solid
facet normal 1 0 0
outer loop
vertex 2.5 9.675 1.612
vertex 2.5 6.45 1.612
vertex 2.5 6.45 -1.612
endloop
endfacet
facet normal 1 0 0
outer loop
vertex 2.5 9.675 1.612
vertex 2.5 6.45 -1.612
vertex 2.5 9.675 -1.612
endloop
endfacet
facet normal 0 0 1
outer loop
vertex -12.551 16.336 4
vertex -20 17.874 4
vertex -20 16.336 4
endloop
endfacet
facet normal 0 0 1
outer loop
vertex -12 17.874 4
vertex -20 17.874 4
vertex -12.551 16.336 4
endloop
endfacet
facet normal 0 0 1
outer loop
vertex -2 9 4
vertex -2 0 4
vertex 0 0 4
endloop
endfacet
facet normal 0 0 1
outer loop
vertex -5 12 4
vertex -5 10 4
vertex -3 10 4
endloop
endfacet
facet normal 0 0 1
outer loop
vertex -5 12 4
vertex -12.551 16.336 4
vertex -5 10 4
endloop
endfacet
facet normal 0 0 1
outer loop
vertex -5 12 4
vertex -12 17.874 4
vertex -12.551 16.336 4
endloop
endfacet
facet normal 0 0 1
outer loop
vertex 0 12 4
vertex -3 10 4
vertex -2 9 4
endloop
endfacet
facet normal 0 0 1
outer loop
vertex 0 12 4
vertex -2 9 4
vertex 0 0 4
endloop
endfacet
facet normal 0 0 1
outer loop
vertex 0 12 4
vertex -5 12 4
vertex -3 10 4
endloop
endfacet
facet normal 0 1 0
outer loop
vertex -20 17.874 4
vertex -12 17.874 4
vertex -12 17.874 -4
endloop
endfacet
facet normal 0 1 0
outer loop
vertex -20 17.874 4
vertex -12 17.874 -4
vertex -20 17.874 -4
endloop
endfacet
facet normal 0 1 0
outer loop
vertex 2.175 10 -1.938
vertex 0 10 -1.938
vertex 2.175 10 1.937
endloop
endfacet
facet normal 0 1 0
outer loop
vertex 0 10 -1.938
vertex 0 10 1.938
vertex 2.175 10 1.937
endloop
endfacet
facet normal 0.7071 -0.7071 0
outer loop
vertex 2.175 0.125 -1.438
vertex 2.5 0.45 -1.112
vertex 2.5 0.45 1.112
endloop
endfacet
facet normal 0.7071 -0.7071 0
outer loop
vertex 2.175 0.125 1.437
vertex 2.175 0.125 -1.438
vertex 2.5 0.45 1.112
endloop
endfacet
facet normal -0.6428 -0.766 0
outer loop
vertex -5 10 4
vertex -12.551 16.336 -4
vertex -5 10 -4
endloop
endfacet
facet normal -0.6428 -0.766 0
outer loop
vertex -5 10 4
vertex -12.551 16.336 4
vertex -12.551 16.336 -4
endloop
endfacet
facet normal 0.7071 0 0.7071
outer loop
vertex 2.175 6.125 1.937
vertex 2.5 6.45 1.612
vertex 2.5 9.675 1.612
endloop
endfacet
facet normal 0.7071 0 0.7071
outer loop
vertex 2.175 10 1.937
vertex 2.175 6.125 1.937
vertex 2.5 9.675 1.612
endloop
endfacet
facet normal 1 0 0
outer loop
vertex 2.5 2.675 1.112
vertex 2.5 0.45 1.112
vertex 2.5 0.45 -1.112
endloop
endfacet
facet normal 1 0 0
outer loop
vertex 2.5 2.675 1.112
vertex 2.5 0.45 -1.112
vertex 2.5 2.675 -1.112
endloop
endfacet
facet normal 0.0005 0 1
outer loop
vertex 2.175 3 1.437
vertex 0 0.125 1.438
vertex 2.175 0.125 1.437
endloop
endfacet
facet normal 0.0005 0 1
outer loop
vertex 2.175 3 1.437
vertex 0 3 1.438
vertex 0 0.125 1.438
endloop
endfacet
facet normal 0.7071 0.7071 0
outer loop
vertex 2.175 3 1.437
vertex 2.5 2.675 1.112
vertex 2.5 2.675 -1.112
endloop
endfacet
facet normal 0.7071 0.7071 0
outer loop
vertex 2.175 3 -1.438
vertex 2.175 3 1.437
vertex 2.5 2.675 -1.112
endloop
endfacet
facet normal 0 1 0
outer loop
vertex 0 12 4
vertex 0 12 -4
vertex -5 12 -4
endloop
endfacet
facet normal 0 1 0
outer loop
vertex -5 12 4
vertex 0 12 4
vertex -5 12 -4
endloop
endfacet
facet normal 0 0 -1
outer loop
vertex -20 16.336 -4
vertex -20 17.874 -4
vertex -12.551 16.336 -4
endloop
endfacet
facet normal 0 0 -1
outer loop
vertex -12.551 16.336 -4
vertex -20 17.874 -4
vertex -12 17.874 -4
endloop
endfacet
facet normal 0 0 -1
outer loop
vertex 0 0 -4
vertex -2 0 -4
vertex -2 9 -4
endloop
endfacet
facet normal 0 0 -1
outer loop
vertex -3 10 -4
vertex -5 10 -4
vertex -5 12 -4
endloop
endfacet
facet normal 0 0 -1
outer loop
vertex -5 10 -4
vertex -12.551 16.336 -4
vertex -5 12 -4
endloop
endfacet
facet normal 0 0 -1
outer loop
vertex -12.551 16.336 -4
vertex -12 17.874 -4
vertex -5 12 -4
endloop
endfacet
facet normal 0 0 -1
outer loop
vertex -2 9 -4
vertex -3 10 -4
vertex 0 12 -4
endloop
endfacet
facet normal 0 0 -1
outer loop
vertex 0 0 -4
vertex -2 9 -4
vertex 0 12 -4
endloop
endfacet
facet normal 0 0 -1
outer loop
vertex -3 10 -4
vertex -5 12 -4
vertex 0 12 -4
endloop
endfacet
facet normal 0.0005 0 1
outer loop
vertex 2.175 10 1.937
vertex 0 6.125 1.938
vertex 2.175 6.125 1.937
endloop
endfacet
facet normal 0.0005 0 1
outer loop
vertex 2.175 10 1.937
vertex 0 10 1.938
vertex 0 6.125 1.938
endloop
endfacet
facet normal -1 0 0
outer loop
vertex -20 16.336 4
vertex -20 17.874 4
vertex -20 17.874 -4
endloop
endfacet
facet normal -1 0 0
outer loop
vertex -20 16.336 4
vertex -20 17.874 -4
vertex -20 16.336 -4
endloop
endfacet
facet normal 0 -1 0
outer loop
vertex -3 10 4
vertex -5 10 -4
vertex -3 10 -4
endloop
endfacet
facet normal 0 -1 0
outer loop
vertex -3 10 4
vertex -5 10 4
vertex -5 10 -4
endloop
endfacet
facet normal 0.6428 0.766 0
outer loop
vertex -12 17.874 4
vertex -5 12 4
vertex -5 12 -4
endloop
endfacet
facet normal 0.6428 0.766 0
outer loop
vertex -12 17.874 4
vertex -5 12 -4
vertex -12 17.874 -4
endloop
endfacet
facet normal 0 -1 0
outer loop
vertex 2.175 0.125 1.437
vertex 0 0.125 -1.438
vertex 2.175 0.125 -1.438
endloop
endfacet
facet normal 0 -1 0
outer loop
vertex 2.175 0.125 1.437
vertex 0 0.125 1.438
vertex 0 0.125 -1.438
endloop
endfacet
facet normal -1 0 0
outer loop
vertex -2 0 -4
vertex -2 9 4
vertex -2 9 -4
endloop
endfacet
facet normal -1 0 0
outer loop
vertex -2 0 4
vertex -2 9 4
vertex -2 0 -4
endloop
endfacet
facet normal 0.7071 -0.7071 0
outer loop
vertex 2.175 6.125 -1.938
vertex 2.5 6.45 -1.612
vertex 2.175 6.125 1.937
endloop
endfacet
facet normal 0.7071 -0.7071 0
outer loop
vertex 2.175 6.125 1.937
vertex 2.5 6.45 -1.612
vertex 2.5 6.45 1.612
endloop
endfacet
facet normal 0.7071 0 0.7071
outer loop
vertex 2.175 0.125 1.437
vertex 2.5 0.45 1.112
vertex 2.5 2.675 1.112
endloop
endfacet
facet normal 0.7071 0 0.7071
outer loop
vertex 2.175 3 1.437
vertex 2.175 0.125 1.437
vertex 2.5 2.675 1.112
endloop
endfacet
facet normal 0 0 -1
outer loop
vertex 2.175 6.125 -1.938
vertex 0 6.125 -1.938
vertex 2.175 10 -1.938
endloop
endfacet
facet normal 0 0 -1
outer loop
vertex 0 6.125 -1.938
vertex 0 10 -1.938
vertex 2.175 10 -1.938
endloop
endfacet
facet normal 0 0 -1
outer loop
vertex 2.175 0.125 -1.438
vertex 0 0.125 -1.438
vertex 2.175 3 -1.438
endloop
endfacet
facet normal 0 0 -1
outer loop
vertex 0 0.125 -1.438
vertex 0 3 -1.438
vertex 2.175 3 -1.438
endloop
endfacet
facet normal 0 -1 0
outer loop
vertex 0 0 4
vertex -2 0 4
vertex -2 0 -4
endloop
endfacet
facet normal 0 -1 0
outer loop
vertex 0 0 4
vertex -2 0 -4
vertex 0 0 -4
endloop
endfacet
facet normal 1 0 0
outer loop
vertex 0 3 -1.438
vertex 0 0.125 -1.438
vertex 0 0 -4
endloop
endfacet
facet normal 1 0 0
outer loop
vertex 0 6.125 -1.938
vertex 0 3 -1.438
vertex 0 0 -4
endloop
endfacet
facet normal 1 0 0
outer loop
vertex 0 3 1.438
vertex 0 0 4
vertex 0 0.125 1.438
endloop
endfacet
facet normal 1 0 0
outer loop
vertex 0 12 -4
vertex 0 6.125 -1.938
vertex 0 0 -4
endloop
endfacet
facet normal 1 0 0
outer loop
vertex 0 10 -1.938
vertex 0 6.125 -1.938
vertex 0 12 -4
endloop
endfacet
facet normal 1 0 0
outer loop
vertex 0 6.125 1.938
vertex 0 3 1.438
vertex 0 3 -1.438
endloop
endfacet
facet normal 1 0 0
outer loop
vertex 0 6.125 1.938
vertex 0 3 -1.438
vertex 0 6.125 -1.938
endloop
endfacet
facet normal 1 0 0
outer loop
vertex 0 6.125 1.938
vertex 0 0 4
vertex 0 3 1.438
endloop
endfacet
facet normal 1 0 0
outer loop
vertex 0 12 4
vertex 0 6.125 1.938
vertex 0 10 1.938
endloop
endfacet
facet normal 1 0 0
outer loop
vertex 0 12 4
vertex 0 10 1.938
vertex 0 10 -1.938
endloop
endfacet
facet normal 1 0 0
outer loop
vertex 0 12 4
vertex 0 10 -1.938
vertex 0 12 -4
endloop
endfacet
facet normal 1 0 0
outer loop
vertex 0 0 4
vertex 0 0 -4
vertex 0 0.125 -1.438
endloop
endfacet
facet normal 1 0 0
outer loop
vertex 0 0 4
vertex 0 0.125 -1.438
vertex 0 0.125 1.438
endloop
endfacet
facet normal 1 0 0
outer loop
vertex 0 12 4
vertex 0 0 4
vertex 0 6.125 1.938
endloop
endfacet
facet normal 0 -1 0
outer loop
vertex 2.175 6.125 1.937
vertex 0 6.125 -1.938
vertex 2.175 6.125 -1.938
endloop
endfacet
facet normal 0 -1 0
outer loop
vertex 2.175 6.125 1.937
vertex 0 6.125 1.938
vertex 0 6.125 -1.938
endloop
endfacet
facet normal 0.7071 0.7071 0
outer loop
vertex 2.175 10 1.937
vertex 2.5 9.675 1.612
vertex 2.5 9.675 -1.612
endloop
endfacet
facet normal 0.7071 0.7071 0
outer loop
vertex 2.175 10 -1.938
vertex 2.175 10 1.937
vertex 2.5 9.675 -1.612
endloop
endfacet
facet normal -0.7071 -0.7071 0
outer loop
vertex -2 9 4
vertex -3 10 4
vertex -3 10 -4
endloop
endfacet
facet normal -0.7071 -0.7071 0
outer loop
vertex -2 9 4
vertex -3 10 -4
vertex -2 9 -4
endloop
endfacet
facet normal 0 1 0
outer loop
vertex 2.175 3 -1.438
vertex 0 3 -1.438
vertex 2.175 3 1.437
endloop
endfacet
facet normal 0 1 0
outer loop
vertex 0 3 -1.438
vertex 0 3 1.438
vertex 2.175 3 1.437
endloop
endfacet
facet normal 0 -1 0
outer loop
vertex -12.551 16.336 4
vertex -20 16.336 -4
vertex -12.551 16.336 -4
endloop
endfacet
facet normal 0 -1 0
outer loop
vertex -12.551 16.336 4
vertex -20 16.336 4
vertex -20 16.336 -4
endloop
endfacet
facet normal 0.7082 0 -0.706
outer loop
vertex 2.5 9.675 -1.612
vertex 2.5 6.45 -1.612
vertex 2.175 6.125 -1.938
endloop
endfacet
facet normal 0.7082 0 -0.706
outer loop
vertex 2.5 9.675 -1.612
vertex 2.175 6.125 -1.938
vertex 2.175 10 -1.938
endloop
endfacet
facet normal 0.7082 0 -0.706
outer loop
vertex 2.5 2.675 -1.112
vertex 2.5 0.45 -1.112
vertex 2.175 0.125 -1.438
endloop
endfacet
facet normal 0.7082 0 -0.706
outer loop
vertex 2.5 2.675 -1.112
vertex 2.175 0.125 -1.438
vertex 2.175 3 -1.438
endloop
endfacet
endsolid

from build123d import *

# Parameters (mm, degrees)
BOSS_EXTRUDE1_DEPTH = 4
SKETCH1_3_W         = 2.5
SKETCH1_3_H         = 3.875
BOSS_EXTRUDE2_DEPTH = 1.9375
SKETCH1_4_W         = 2.5
SKETCH1_4_H         = 2.875
BOSS_EXTRUDE3_DEPTH = 1.4375
CHAMFER1_SIZE       = 0.325


with BuildPart() as part:
    # Sketch1 → Boss-Extrude1 (new, symmetric)
    with BuildSketch(Plane.XY):
        Polygon((-2, 0), (0, 0), (0, 12), (-5, 12), (-12, 17.873697418), (-20, 17.873697418), (-20, 16.335837533), (-12.550757142, 16.335837533), (-5, 10), (-3, 10), (-2, 9), align=None)
    extrude(amount=BOSS_EXTRUDE1_DEPTH, both=True)

    # Sketch1<3> → Boss-Extrude2 (add, symmetric)
    with BuildSketch(Plane.XY):
        with Locations((1.25, 8.0625)):
            Rectangle(SKETCH1_3_W, SKETCH1_3_H)
    extrude(amount=BOSS_EXTRUDE2_DEPTH, both=True)

    # Sketch1<4> → Boss-Extrude3 (add, symmetric)
    with BuildSketch(Plane.XY):
        with Locations((1.25, 1.5625)):
            Rectangle(SKETCH1_4_W, SKETCH1_4_H)
    extrude(amount=BOSS_EXTRUDE3_DEPTH, both=True)

    # Chamfer1
    chamfer1_edges = [part.edges().sort_by_distance(p)[0] for p in [
        (2.5, 0.125, 0),
        (2.5, 1.5625, 1.4375),
        (2.5, 3, 0),
        (2.5, 1.5625, -1.4375),
        (2.5, 6.125, 0),
        (2.5, 8.0625, 1.9375),
        (2.5, 10, 0),
        (2.5, 8.0625, -1.9375),
    ]]
    chamfer(chamfer1_edges, length=CHAMFER1_SIZE)


solid = part.part
